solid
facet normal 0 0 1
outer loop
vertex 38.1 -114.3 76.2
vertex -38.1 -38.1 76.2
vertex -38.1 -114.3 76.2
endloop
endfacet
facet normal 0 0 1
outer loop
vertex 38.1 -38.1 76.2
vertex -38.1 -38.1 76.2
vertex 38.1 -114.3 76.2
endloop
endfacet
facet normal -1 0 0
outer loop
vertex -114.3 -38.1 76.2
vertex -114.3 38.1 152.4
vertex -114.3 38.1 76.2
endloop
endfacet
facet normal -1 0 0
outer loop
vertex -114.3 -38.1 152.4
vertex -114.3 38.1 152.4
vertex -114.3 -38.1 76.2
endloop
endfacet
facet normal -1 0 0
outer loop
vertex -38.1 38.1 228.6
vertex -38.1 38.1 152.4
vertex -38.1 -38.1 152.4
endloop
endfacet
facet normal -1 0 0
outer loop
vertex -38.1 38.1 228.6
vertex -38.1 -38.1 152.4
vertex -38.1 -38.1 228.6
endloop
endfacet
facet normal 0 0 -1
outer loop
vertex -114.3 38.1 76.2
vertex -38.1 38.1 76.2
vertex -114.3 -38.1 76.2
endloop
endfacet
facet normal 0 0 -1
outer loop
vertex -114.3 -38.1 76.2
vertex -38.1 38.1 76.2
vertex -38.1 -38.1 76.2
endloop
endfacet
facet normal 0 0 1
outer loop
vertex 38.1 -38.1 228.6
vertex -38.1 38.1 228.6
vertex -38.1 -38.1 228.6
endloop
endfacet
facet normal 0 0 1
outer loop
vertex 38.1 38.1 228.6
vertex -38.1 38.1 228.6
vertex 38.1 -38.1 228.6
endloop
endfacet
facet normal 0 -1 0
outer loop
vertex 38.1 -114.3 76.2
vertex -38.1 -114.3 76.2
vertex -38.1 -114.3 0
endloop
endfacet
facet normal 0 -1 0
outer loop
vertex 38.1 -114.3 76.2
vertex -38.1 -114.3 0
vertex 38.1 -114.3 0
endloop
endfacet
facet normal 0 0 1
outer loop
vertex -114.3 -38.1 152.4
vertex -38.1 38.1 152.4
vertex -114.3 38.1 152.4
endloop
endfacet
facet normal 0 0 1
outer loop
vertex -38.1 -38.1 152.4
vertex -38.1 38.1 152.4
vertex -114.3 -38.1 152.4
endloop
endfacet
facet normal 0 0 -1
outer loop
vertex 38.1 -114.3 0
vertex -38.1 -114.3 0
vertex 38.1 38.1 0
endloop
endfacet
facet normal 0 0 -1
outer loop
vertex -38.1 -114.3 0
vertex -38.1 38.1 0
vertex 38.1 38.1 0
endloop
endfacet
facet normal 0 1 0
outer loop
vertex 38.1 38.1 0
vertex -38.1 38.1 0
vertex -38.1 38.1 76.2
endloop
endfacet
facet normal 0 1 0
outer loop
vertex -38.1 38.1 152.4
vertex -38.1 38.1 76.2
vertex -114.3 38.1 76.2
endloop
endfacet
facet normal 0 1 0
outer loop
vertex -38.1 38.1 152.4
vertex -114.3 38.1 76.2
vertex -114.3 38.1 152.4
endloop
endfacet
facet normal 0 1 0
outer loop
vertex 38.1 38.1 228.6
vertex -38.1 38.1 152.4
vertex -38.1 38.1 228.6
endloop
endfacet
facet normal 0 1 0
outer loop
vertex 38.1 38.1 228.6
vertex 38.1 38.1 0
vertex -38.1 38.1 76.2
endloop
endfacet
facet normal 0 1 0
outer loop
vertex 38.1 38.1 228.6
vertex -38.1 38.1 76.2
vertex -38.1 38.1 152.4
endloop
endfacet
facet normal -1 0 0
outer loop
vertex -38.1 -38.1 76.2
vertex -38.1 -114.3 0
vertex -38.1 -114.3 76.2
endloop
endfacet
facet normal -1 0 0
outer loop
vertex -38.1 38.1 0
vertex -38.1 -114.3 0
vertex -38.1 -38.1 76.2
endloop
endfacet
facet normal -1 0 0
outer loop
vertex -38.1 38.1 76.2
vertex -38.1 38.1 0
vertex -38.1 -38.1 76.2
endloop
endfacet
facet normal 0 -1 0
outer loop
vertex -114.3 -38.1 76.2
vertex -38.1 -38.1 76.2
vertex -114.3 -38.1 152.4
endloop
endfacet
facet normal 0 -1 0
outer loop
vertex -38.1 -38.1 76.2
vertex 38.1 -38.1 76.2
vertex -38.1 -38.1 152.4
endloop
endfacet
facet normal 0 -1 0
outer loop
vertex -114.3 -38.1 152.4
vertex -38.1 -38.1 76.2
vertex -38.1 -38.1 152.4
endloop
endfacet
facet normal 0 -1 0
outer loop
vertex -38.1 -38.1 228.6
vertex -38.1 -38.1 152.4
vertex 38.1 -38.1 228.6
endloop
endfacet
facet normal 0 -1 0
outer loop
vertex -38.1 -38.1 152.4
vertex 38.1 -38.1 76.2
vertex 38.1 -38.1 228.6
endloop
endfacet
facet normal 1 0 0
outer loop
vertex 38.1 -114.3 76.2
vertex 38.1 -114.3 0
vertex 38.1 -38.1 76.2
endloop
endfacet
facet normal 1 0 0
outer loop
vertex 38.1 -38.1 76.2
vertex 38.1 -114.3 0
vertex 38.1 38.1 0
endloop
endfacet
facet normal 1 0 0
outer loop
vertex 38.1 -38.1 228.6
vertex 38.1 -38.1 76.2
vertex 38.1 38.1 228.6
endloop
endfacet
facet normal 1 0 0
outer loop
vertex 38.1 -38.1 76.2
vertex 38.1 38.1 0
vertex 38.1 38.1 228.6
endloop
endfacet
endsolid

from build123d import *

# Parameters (mm, degrees)
F1_W     = 76.2
F1_H     = 76.2
F2_DEPTH = 228.6
F3_W     = 76.2
F3_H     = 76.2
F4_DEPTH = 76.2
F5_W     = 76.2
F5_H     = 76.2
F6_DEPTH = 76.2


# Not quite as in the source:
# - a variable given as a bare number and used for a length is read in inches; the dataset says mm whatever the document's units were


with BuildPart() as f2:
    # F1 (on Top) → F2 (new body)
    with BuildSketch(Plane.XY):
        Rectangle(F1_W, F1_H)
    extrude(amount=F2_DEPTH)

    # F3 (on face) → F4 (join)
    with BuildSketch(Plane.XZ.offset(38.1)):
        with Locations((0, 38.1)):
            Rectangle(F3_W, F3_H)
    extrude(amount=F4_DEPTH)

    # F5 (on face) → F6 (join)
    with BuildSketch(Plane(origin=(-38.1, 0, 0), x_dir=(0, -1, 0), z_dir=(-1, 0, 0))):
        with Locations((0, 114.3)):
            Rectangle(F5_W, F5_H)
    extrude(amount=F6_DEPTH)


solid = f2.part
